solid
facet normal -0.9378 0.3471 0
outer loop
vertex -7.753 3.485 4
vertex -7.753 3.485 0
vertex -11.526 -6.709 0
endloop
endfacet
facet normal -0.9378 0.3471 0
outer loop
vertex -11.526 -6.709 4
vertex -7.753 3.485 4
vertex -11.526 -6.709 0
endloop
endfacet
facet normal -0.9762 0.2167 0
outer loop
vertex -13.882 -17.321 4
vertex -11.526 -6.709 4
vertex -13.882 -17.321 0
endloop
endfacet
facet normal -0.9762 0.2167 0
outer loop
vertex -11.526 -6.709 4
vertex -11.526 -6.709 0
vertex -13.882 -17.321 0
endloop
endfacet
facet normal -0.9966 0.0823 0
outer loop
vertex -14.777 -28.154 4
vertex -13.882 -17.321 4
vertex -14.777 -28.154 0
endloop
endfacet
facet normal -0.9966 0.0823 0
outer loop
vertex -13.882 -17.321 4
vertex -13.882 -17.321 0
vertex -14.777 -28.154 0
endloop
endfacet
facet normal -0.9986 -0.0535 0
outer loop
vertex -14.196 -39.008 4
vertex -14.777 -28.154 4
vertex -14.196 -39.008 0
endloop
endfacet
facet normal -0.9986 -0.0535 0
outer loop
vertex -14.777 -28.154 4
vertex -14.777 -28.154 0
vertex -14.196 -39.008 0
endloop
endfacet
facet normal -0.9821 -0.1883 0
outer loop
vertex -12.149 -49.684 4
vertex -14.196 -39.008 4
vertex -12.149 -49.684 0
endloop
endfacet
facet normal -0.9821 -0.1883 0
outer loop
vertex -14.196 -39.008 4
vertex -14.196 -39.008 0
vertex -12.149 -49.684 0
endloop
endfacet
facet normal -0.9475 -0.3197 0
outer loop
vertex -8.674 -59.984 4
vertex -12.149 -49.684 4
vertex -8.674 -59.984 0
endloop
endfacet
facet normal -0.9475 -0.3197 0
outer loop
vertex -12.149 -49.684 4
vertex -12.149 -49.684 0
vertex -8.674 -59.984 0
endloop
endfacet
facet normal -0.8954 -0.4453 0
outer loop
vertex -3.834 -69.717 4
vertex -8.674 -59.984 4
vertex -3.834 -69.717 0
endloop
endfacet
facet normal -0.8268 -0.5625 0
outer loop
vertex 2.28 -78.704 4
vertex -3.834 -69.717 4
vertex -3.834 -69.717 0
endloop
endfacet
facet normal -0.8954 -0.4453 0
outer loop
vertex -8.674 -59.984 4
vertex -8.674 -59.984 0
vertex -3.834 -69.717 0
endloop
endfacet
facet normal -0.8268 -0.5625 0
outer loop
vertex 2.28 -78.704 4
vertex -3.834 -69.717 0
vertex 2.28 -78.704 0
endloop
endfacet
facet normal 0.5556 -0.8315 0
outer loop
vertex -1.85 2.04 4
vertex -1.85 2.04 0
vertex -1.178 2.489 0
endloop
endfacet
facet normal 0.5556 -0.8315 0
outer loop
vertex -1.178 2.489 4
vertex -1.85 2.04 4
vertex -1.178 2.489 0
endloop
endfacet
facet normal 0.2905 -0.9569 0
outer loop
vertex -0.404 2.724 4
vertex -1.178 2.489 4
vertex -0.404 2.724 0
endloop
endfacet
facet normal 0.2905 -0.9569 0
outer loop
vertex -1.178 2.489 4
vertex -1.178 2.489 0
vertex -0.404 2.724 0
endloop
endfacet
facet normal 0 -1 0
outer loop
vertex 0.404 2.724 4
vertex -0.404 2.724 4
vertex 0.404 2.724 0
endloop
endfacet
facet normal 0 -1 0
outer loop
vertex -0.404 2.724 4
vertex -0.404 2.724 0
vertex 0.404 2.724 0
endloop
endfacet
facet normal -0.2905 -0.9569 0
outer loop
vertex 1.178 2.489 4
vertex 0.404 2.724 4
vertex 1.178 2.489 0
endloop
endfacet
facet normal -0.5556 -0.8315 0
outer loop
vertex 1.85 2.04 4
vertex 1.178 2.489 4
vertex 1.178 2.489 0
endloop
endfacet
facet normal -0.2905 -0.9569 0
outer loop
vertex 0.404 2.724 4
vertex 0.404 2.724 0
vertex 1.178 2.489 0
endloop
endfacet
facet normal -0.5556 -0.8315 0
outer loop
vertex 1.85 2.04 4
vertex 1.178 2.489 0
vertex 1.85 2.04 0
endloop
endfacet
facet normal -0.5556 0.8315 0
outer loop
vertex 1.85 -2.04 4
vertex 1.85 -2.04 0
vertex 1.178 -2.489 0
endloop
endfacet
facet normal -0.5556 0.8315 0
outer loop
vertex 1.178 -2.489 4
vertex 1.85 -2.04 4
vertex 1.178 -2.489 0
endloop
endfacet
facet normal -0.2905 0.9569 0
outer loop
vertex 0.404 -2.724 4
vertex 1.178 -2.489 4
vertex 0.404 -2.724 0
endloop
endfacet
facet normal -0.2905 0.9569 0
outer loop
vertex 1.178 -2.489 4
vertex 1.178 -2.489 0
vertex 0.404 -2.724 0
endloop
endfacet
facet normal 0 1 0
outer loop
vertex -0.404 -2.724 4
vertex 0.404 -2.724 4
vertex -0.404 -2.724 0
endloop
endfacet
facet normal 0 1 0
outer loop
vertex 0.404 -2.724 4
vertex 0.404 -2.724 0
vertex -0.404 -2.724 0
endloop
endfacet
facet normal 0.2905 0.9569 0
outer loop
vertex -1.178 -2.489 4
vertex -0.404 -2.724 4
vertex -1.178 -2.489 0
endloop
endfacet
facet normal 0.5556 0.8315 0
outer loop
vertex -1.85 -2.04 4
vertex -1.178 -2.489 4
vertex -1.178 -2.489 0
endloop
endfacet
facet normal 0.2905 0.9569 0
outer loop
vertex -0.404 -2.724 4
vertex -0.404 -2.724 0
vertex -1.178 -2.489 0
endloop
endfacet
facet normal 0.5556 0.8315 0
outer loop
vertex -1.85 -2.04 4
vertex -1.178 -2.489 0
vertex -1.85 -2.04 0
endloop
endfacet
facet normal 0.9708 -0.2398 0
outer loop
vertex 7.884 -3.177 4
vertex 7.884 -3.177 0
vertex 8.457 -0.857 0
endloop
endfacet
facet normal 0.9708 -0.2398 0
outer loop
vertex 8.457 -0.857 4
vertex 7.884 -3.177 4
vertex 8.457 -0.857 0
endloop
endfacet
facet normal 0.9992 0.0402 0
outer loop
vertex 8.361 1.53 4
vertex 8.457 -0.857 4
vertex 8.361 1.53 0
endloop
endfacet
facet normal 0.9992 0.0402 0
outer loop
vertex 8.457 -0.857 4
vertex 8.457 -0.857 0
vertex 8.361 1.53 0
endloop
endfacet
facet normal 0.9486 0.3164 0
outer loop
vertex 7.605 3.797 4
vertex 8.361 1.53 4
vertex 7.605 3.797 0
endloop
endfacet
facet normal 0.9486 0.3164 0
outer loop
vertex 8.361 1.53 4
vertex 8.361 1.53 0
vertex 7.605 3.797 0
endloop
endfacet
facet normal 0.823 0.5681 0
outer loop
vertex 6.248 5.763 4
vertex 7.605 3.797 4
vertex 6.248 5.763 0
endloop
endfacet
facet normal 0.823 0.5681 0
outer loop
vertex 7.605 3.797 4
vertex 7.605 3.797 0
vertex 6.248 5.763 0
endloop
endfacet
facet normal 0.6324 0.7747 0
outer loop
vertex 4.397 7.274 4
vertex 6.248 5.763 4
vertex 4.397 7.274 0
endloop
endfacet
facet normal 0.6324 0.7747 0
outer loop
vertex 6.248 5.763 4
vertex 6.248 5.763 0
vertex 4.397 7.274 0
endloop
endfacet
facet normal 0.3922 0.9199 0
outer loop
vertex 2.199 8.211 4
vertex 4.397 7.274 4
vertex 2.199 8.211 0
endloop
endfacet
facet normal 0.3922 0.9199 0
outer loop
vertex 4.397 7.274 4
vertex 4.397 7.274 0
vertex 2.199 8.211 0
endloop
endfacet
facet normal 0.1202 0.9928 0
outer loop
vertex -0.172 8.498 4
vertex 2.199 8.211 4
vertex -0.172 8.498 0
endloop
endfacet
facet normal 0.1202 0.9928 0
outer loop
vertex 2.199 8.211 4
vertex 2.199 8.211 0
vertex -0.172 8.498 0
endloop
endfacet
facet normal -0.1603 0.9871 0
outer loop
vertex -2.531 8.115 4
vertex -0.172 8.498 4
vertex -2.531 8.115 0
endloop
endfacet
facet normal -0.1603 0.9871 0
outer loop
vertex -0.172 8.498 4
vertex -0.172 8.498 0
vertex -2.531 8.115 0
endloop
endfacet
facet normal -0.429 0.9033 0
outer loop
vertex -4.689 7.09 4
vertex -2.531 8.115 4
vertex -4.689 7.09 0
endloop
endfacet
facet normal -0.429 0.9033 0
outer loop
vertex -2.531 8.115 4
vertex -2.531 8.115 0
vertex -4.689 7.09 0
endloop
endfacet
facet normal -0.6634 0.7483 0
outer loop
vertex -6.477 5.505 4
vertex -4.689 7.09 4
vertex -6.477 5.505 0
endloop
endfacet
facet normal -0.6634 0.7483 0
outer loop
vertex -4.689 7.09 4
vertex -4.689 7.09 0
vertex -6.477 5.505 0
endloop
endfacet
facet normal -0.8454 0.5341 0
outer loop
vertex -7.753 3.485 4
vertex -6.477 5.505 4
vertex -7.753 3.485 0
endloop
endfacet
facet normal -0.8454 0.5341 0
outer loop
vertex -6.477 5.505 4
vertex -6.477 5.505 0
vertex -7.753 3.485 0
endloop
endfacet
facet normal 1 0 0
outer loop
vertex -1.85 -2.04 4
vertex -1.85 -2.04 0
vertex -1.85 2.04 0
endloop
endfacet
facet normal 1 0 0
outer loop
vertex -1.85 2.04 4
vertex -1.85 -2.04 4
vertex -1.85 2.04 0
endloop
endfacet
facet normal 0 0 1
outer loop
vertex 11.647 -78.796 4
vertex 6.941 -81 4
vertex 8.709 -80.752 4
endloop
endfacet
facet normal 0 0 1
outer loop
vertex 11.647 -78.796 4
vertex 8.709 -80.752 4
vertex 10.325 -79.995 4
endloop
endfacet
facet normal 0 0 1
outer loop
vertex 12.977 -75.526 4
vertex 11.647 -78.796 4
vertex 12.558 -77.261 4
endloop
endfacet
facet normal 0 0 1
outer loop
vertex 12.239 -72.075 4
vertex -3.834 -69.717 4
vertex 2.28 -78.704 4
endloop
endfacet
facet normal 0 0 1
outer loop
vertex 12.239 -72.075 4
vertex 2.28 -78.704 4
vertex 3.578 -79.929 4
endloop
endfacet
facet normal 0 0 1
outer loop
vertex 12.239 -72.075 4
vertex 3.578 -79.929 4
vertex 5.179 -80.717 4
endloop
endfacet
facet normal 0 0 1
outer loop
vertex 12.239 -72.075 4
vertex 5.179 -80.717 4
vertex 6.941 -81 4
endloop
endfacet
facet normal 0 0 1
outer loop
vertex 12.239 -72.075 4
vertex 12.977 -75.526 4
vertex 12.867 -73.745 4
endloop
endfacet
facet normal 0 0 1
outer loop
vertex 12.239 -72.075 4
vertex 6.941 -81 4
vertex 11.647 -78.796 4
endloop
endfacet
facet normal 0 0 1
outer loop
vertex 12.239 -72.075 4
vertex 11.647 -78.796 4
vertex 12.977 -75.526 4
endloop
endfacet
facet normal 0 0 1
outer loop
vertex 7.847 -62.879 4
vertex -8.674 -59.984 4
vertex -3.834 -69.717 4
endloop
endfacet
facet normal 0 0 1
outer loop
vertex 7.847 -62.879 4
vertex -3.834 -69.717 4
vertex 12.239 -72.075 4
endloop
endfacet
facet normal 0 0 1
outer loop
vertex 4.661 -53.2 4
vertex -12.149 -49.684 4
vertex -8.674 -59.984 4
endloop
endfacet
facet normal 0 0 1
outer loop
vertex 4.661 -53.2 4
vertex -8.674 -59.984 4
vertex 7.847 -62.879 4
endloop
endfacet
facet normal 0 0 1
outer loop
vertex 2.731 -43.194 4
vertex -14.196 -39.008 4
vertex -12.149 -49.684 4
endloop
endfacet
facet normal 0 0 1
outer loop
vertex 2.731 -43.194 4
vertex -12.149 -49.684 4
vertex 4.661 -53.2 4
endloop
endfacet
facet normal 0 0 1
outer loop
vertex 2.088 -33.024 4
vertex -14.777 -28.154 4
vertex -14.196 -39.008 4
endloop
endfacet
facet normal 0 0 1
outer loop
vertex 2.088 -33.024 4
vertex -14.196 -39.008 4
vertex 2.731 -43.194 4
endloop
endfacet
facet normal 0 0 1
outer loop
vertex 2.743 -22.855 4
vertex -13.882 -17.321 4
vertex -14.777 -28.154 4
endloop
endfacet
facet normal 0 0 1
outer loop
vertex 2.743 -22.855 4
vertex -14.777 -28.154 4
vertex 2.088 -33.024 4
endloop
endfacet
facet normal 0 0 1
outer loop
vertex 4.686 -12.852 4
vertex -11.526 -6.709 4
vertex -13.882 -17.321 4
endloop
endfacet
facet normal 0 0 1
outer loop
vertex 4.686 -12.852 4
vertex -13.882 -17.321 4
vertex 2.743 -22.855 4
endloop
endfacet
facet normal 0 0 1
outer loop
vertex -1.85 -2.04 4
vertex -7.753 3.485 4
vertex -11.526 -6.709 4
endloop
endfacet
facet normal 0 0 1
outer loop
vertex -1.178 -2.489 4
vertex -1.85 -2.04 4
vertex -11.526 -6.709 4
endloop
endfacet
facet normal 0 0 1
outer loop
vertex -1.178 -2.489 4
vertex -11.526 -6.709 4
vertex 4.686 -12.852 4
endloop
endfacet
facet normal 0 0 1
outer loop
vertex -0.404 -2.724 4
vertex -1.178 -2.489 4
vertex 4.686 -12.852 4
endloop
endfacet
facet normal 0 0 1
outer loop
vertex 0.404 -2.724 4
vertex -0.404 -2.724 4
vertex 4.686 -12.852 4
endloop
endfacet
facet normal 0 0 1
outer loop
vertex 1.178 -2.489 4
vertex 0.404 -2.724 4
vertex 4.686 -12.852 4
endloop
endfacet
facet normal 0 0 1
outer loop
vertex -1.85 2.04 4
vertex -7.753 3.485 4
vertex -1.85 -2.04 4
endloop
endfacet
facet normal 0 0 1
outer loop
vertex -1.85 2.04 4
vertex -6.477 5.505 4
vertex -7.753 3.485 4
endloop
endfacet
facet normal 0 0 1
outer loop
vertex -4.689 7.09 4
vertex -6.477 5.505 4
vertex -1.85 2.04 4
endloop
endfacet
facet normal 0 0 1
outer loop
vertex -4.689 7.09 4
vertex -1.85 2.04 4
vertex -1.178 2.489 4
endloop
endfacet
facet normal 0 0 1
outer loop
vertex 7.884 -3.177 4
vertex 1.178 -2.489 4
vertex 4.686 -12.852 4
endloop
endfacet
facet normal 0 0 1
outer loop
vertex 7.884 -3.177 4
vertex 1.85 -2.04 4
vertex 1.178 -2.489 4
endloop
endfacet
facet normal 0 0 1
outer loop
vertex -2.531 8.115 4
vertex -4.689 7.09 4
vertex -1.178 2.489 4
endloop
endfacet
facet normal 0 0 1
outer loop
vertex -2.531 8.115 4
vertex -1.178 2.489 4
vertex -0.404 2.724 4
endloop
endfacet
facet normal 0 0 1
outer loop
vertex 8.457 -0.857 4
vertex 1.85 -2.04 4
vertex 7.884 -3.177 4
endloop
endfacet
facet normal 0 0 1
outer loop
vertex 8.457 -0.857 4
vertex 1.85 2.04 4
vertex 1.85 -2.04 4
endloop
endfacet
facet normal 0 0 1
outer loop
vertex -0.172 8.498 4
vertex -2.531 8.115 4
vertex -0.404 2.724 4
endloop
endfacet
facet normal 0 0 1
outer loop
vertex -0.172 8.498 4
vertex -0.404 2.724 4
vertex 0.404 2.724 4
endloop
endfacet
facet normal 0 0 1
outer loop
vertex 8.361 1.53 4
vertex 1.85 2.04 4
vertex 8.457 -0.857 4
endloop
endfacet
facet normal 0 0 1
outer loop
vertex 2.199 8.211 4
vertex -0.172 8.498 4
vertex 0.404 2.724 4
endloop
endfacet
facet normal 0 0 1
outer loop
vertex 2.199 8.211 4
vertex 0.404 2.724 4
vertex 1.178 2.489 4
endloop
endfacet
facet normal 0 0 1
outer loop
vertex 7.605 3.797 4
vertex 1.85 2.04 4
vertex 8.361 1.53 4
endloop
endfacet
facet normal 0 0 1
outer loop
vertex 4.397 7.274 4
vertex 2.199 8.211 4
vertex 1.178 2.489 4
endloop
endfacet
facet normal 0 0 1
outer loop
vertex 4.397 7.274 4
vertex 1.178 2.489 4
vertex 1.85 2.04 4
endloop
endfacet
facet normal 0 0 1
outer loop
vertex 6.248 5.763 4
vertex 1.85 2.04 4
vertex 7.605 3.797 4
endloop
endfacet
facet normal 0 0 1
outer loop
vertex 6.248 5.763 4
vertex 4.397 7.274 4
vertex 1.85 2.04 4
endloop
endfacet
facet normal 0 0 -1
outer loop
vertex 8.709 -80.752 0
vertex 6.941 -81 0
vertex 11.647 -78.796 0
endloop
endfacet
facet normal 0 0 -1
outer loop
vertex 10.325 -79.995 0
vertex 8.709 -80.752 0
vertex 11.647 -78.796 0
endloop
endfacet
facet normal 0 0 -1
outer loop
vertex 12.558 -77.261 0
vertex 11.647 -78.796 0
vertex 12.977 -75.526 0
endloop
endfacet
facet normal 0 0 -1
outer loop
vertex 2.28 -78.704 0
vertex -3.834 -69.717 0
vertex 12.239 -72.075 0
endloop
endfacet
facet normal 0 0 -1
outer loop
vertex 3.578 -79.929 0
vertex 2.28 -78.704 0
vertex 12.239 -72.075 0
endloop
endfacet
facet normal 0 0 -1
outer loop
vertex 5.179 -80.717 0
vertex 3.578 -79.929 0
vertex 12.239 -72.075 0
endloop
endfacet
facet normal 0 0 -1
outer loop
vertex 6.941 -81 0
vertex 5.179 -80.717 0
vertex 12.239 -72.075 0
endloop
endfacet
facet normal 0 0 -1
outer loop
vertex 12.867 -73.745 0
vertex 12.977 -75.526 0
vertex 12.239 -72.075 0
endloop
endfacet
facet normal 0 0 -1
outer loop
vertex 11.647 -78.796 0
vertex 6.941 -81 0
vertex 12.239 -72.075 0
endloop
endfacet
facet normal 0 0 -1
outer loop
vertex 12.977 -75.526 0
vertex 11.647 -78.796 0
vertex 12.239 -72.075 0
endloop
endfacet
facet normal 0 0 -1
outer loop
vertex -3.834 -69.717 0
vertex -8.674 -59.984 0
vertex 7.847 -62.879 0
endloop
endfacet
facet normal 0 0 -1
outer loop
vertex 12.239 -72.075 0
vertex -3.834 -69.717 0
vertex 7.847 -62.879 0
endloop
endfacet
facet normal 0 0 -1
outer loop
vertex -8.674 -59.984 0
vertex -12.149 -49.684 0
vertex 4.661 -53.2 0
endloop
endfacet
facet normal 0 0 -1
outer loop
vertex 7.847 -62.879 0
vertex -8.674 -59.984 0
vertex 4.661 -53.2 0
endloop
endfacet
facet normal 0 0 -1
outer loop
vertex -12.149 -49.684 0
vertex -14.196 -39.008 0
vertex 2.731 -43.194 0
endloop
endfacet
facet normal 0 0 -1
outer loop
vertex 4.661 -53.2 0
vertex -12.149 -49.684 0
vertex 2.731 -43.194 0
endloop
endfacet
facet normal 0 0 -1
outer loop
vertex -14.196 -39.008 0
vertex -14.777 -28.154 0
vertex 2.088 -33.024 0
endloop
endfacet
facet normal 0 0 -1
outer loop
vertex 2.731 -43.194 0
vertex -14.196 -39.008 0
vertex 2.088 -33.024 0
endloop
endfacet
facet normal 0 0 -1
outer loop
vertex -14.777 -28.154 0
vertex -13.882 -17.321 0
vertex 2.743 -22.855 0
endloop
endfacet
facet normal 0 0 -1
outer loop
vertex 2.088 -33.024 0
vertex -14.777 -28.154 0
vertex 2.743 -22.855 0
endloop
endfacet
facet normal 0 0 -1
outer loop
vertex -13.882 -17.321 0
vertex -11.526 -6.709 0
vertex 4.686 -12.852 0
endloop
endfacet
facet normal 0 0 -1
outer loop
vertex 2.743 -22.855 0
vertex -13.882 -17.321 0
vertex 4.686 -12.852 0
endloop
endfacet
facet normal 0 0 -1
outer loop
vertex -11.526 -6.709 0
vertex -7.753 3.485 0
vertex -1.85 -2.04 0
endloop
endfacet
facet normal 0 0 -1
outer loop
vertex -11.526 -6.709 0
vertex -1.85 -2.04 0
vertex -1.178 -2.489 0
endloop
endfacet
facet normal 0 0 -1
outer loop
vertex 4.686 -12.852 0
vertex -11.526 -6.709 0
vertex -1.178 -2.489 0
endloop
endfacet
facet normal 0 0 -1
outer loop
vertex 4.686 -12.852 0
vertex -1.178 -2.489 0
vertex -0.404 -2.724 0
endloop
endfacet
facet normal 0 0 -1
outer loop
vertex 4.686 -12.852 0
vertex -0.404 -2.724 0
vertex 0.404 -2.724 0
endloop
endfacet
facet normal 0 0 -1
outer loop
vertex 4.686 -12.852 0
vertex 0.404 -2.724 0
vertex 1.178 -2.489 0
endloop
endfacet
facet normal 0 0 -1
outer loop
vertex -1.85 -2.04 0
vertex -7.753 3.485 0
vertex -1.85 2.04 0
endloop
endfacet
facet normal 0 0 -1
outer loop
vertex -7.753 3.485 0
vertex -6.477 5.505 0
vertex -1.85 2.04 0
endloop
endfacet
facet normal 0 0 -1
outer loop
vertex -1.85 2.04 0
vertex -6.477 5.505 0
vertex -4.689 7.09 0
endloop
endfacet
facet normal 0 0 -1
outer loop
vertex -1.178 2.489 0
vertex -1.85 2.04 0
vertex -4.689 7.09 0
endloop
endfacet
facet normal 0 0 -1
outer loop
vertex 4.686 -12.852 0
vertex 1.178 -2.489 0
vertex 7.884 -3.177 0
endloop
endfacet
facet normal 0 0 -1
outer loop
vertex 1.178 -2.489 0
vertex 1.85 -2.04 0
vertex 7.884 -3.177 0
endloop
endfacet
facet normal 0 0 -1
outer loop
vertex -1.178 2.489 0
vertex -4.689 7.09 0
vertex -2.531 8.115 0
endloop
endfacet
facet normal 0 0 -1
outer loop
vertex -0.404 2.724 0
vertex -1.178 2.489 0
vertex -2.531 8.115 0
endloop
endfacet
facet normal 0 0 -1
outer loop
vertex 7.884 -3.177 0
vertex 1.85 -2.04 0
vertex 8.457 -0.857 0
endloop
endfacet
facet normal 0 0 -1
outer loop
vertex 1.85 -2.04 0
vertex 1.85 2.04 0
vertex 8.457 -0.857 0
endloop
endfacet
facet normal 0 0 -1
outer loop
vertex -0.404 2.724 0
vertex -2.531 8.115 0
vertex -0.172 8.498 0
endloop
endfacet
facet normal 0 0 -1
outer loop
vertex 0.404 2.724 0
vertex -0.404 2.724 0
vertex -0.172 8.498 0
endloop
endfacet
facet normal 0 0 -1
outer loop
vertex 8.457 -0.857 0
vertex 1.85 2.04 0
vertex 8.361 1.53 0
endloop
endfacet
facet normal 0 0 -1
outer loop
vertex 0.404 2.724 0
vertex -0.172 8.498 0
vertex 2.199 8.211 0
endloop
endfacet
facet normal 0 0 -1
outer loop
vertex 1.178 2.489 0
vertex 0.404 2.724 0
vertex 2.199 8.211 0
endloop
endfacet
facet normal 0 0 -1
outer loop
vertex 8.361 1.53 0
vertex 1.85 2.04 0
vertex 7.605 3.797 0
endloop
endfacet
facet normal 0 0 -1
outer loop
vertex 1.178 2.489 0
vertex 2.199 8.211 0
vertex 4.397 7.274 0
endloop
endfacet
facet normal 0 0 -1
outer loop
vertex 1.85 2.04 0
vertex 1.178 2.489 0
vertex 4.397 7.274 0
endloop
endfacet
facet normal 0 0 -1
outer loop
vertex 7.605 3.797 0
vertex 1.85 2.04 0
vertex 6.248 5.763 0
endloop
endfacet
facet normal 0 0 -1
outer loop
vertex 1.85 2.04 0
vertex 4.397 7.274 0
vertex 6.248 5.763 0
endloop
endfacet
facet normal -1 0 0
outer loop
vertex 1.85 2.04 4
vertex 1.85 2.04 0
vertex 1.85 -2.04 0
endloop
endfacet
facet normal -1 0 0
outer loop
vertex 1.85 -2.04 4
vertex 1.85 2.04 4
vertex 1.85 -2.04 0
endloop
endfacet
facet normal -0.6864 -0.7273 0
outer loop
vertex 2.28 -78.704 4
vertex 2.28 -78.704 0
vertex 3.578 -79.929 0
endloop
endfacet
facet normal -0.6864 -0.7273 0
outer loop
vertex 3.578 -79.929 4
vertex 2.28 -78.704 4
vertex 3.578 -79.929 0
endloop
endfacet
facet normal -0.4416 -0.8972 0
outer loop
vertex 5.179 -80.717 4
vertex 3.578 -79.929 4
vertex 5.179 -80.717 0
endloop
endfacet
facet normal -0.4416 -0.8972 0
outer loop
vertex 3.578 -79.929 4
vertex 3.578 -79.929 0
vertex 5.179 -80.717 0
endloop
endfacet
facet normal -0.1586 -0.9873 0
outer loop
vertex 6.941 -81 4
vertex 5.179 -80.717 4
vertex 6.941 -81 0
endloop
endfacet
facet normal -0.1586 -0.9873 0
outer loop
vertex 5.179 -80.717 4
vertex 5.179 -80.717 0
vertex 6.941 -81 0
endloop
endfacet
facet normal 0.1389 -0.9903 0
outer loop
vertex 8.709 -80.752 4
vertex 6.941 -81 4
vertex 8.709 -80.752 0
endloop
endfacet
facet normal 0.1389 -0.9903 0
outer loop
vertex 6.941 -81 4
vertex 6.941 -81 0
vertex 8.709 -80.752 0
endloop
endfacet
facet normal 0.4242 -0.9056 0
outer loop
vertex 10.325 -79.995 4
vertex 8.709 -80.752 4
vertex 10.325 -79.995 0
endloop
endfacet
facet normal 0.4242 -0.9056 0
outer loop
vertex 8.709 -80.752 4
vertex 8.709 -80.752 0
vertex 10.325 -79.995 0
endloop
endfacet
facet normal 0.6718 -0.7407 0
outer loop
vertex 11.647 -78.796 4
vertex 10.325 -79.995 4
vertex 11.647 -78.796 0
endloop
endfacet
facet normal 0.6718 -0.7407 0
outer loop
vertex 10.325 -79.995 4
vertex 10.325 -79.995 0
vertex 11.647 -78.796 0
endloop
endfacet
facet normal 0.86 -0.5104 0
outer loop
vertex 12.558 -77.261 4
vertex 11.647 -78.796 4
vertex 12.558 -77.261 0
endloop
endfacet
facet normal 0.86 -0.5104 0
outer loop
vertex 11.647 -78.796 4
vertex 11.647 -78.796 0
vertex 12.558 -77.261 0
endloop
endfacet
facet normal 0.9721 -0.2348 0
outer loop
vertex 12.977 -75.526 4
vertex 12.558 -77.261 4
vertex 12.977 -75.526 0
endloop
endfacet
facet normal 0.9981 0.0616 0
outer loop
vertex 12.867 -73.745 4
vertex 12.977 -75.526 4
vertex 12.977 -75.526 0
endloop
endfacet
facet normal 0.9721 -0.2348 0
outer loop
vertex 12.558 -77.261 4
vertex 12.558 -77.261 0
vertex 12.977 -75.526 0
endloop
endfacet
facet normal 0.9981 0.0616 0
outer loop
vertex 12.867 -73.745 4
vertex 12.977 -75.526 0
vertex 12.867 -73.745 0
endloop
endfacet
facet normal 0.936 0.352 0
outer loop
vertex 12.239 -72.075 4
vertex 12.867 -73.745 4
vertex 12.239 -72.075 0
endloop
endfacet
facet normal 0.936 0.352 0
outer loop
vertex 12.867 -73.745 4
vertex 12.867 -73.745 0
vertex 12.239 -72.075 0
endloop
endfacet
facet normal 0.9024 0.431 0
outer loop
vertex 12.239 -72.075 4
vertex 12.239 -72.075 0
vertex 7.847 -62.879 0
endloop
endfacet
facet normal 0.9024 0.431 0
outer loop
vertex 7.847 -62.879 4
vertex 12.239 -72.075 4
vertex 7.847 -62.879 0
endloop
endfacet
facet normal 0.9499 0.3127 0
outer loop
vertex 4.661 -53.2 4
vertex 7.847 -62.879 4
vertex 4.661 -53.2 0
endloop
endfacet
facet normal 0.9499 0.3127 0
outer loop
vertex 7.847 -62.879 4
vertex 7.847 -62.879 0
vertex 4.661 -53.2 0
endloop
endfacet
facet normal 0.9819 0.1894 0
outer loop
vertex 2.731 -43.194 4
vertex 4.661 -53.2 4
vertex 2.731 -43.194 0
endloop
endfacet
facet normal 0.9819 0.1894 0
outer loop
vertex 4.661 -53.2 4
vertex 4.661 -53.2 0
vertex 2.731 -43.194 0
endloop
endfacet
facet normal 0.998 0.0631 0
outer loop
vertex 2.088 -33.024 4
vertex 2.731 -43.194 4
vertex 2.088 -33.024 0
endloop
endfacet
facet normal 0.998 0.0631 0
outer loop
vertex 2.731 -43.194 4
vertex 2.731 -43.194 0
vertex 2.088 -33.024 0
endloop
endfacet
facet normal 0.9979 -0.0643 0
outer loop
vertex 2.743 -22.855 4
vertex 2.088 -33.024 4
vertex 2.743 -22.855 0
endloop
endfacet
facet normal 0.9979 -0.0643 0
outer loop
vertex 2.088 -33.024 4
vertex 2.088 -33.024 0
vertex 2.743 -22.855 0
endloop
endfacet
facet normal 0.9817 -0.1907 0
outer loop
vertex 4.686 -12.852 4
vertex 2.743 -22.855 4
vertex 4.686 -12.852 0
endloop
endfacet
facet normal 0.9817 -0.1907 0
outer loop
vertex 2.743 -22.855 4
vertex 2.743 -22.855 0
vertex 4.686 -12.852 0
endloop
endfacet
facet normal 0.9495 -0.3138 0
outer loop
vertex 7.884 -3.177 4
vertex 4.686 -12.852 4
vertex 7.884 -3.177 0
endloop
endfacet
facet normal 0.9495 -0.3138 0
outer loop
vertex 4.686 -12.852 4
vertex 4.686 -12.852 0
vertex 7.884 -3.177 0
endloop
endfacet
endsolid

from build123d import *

# Parameters (mm, degrees)
BOSS_EXTRUDE1_DEPTH = 4


with BuildPart() as part:
    # Sketch1 → Boss-Extrude1 (new body)
    with BuildSketch(Plane.XY):
        with BuildLine():
            ThreePointArc((7.884132017, -3.176548808), (3.33142336, 7.819950025), (-7.75272605, 3.485001979))
            ThreePointArc((-7.75272605, 3.485001979), (-14.196448744, -39.008497905), (2.279937241, -78.704187839))
            ThreePointArc((2.279937241, -78.704187839), (10.324774467, -79.994584542), (12.238678661, -72.074893868))
            ThreePointArc((12.238678661, -72.074893868), (2.247032536, -38.119609121), (7.884132017, -3.176548808))
        make_face()
        with BuildLine():
            Line((-1.85, -2.04), (-1.85, 2.04))
            ThreePointArc((-1.85, 2.04), (0, 2.753924472), (1.85, 2.04))
            Line((1.85, 2.04), (1.85, -2.04))
            ThreePointArc((1.85, -2.04), (0, -2.753924472), (-1.85, -2.04))
        make_face(mode=Mode.SUBTRACT)
    extrude(amount=BOSS_EXTRUDE1_DEPTH)


solid = part.part
